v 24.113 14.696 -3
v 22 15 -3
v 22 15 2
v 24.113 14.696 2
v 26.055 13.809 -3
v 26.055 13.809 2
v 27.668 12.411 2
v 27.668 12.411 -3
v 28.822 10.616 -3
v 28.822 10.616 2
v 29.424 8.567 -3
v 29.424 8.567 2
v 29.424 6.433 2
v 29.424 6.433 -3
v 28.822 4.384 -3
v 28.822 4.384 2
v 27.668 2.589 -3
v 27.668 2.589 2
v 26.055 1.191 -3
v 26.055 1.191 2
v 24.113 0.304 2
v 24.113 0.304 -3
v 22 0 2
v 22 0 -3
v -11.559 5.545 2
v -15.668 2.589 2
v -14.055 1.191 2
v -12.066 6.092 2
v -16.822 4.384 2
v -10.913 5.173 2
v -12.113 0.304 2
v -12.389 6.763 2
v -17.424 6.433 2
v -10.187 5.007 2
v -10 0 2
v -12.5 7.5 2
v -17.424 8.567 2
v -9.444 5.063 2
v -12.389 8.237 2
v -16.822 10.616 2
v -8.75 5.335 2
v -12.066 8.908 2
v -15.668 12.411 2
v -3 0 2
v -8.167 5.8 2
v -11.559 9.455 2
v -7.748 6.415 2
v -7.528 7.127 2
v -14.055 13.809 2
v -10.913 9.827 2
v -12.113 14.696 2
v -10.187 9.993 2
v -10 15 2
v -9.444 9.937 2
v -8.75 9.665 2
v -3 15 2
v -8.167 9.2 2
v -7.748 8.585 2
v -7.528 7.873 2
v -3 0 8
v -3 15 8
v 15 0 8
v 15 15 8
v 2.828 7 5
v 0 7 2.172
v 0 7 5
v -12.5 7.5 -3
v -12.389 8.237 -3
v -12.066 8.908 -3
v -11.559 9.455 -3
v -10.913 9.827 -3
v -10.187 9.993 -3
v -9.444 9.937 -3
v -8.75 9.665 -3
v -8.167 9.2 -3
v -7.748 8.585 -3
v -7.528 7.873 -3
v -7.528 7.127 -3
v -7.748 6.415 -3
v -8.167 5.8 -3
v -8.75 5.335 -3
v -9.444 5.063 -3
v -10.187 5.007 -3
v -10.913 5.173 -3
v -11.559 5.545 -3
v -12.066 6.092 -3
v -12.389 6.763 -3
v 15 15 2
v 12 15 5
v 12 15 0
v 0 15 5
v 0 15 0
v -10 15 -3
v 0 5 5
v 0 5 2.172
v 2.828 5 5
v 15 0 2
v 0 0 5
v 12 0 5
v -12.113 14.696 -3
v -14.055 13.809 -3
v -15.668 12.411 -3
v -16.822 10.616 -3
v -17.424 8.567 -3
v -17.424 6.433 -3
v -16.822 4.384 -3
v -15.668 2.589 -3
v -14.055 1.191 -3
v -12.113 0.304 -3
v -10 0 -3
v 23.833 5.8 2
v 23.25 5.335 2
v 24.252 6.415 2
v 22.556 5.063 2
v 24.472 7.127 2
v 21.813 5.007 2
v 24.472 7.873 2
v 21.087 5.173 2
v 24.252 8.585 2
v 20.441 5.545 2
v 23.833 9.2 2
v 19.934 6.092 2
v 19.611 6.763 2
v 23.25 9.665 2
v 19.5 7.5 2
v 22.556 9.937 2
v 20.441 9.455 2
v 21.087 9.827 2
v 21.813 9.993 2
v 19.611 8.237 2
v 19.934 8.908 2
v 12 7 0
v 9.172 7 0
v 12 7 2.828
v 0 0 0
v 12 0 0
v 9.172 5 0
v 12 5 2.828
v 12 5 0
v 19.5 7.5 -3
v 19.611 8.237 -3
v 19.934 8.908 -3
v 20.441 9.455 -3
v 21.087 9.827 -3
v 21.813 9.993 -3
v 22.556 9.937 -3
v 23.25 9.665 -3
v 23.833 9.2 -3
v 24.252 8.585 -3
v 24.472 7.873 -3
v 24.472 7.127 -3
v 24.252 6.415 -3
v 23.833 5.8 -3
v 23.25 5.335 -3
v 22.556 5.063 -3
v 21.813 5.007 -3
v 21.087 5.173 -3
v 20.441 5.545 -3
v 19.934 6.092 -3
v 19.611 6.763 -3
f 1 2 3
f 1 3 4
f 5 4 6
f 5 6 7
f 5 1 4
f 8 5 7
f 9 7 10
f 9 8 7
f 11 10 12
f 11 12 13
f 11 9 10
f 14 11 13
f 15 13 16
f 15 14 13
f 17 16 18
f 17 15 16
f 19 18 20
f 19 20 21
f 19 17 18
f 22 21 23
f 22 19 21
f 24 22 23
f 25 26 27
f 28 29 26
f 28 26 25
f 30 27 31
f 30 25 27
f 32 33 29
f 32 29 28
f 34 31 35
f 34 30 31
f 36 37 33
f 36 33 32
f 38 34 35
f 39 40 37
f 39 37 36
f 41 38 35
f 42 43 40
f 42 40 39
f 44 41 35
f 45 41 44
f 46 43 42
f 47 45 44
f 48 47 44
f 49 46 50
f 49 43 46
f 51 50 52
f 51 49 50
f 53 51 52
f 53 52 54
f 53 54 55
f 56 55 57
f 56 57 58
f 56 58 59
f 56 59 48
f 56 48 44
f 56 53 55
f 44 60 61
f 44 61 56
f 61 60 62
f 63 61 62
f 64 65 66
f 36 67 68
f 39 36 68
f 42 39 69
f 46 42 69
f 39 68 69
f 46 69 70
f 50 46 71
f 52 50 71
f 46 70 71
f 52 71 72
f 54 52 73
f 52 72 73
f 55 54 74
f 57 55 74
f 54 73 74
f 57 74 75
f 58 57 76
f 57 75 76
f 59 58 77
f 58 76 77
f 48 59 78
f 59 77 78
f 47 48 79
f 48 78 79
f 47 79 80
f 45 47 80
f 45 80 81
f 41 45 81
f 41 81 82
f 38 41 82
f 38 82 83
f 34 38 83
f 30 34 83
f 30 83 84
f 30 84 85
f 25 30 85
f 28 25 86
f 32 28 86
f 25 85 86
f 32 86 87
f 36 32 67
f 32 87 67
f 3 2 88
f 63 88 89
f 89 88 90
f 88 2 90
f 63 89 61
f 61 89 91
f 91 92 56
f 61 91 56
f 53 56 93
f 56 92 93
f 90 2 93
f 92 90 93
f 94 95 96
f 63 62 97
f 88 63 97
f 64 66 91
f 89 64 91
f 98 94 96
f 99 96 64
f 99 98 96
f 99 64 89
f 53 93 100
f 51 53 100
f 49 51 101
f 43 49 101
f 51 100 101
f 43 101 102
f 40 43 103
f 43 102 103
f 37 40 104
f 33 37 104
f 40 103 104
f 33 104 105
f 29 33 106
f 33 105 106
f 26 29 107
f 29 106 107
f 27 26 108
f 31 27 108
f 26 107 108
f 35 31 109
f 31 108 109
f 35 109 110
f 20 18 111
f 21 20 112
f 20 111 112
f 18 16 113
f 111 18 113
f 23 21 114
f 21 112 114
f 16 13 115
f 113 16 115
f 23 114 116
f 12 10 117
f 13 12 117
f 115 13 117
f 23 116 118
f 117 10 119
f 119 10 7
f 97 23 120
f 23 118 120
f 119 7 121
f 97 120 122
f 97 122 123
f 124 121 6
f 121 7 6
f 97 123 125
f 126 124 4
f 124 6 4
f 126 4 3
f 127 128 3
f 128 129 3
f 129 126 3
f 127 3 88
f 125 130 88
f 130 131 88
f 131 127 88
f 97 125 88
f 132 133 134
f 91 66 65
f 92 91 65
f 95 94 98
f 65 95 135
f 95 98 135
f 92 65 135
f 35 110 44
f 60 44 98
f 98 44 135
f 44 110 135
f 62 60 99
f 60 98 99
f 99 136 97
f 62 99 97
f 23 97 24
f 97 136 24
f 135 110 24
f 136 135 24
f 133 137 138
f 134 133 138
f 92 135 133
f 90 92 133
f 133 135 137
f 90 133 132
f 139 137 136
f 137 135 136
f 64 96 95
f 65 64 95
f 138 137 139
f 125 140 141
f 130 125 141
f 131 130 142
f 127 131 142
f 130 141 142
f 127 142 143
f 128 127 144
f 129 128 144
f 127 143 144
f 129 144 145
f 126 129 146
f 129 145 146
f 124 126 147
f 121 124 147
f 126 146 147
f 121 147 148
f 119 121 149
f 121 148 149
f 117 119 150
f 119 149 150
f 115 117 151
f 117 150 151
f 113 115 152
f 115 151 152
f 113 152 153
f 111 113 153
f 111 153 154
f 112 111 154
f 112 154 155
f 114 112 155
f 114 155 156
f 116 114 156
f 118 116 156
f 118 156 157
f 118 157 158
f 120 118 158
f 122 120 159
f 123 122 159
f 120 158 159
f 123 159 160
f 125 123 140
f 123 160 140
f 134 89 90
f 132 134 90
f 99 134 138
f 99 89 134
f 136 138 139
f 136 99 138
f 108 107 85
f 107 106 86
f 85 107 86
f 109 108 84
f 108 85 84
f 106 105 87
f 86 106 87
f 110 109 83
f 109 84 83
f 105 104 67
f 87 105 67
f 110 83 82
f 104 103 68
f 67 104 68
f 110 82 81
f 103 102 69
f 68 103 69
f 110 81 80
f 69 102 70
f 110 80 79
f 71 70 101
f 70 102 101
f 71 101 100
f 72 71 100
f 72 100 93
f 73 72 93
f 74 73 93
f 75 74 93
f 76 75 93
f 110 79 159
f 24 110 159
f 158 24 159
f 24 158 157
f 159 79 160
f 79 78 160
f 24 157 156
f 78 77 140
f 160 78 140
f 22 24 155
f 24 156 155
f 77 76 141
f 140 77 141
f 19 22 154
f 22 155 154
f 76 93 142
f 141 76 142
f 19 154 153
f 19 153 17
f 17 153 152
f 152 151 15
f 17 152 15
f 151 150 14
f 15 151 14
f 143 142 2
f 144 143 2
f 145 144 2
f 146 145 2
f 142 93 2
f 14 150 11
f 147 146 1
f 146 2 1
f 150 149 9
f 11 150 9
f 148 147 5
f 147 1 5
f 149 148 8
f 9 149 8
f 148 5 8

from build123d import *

# Parameters (mm, degrees)
SKETCH1_W           = 18
SKETCH1_H           = 11
SKETCH1_W_2         = 12
SKETCH1_H_2         = 5
BOSS_EXTRUDE1_DEPTH = 15
SKETCH2_R           = 2.5
BOSS_EXTRUDE2_DEPTH = 5
BOSS_EXTRUDE3_DEPTH = 2


with BuildPart() as part:
    # Sketch1 → Boss-Extrude1 (new body)
    with BuildSketch(Plane(origin=(0, 0, 0), x_dir=(1, 0, 0), z_dir=(0, 1, 0))):
        with Locations((6, -2.5)):
            Rectangle(SKETCH1_W, SKETCH1_H)
        with Locations((6, -2.5)):
            Rectangle(SKETCH1_W_2, SKETCH1_H_2, mode=Mode.SUBTRACT)
    extrude(amount=BOSS_EXTRUDE1_DEPTH)

    # Sketch2 → Boss-Extrude2 (add)
    with BuildSketch(Plane(origin=(0, 0, -3), x_dir=(-1, 0, 0), z_dir=(0, 0, -1))):
        with BuildLine():
            ThreePointArc((10, 15), (17.5, 7.5), (10, 0))
            Line((10, 0), (3, 0))
            Line((3, 0), (3, 15))
            Line((3, 15), (10, 15))
        make_face()
        with Locations((10, 7.5)):
            Circle(SKETCH2_R, mode=Mode.SUBTRACT)
        with BuildLine():
            Line((-15, 15), (-22, 15))
            ThreePointArc((-22, 15), (-29.5, 7.5), (-22, 0))
            Line((-22, 0), (-15, 0))
            Line((-15, 0), (-15, 15))
        make_face()
        with Locations((-22, 7.5)):
            Circle(SKETCH2_R, mode=Mode.SUBTRACT)
    extrude(amount=-BOSS_EXTRUDE2_DEPTH)

    # Sketch3 → Boss-Extrude3 (add)
    with BuildSketch(Plane(origin=(0, 5, 0), x_dir=(-1, 0, 0), z_dir=(0, -1, 0))):
        Polygon((-12, -2.828427125), (-12, 0), (-9.171572875, 0), align=None)
        Polygon((0, -2.171572875), (0, -5), (-2.828427125, -5), align=None)
    extrude(amount=-BOSS_EXTRUDE3_DEPTH)


solid = part.part
